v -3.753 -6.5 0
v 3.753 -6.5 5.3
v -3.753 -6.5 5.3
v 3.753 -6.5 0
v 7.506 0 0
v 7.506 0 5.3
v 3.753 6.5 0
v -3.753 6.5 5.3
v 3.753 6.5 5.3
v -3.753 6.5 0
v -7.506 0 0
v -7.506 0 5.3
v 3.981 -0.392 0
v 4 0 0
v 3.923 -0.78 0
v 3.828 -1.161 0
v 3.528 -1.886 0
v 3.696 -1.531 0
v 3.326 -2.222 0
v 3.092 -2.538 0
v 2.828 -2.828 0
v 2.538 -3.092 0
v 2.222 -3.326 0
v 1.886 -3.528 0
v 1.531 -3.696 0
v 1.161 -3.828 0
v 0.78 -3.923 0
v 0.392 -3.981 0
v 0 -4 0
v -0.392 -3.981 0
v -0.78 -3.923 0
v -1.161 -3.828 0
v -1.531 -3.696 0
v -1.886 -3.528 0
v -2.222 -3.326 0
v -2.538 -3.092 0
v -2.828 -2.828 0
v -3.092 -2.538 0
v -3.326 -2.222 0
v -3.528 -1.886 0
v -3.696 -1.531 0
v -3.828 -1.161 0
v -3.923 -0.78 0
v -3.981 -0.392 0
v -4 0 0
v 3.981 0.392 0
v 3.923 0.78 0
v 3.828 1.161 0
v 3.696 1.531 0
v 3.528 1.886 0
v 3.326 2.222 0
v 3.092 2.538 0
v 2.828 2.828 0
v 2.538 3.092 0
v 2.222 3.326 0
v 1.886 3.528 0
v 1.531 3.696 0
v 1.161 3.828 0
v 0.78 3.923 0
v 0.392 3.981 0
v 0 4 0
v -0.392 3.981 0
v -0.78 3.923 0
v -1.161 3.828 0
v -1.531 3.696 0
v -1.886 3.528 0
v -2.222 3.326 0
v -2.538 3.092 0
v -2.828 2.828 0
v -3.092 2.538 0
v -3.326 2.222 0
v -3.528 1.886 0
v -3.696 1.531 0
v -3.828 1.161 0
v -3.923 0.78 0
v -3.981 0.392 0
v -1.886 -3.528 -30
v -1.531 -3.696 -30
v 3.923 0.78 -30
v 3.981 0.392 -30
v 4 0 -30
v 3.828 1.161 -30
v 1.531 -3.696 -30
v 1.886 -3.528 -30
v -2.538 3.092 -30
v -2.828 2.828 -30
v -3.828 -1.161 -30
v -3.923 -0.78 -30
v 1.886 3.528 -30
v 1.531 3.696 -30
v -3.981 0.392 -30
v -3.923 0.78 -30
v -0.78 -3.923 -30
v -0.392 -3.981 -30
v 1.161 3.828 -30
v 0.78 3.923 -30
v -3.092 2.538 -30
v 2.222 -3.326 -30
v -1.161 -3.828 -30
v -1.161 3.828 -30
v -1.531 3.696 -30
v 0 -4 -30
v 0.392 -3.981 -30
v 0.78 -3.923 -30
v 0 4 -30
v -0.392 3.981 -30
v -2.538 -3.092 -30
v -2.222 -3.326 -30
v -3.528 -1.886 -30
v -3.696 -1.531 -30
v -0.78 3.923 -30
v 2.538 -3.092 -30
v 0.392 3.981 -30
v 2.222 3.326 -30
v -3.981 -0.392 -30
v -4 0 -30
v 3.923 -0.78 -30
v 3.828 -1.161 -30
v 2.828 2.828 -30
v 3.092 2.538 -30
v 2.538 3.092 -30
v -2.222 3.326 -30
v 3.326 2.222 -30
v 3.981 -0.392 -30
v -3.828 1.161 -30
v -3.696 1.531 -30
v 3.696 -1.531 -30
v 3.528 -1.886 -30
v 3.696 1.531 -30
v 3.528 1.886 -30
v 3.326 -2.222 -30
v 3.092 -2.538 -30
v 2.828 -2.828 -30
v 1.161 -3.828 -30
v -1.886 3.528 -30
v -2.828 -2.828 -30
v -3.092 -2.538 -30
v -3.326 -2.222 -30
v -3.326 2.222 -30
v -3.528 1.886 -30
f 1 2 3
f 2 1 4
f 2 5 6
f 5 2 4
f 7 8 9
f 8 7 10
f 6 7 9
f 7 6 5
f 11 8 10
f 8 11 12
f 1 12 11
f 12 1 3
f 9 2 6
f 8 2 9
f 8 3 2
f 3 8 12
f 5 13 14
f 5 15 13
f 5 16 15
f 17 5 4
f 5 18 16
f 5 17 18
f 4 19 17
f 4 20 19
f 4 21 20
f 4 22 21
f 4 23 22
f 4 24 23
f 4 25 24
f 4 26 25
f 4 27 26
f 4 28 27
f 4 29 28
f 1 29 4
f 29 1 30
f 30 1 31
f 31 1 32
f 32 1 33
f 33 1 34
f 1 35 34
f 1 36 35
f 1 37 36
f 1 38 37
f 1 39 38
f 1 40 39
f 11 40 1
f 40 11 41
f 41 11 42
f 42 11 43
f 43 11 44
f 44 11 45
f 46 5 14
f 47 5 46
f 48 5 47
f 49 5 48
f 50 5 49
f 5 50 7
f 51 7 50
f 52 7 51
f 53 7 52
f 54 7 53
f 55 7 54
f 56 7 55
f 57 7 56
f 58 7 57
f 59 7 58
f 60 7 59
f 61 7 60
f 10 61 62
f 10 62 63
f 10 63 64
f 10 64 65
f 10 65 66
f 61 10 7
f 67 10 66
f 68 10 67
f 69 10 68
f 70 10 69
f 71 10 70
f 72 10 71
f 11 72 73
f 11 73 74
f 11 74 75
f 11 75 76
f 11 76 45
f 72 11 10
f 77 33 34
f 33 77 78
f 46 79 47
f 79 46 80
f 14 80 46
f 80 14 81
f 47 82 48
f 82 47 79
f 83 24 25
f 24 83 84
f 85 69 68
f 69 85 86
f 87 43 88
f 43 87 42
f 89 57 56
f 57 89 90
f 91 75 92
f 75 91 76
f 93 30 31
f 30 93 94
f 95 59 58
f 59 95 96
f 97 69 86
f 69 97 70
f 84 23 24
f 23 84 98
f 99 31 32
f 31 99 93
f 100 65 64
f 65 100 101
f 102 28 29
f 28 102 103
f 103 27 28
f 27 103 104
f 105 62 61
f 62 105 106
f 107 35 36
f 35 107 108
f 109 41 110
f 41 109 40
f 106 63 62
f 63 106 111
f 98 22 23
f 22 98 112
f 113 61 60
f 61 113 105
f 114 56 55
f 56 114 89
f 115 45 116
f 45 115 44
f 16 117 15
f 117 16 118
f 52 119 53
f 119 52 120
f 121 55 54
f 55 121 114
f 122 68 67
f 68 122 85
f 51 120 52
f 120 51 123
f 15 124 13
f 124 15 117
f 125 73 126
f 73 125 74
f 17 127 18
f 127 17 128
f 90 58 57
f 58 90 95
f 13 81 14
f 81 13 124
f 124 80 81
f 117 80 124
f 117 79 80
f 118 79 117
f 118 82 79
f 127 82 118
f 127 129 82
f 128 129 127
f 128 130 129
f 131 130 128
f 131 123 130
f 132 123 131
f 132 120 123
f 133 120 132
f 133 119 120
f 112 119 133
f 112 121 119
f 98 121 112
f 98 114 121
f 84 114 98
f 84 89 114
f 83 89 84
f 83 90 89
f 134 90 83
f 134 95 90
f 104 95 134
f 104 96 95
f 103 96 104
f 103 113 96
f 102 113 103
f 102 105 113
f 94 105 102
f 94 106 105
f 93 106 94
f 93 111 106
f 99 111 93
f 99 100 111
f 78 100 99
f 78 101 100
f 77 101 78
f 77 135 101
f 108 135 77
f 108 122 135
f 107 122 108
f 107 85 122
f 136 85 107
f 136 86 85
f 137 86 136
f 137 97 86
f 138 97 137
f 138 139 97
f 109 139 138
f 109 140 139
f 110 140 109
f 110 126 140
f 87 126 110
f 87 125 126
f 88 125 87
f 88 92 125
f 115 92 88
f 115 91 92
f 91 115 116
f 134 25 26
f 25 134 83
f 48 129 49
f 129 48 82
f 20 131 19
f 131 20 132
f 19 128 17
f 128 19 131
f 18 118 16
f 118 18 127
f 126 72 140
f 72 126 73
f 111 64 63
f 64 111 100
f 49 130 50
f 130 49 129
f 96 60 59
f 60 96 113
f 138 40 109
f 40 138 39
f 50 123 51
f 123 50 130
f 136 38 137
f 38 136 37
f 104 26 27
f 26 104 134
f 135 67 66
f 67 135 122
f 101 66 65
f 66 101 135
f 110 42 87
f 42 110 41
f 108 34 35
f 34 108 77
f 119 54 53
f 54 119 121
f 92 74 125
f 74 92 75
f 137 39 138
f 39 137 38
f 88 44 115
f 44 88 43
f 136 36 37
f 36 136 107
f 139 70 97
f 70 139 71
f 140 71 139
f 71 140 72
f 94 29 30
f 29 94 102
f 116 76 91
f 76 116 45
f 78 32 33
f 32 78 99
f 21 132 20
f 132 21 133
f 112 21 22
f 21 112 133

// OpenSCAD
// M8 Hex Bolt (simplified without threads)

// Parameters
head_across_flats = 13;    // Across-flats distance (mm)
head_height = 5.3;         // Head height (mm)
shank_diameter = 8;        // Shank diameter (mm)
shank_length = 30;         // Shank length (mm)

// Calculate circumscribed radius for hexagon
// For a regular hexagon with $fn=6, cylinder uses circumradius
// across_flats = 2 * circumradius * cos(30°) = circumradius * sqrt(3)
// Therefore: circumradius = across_flats / sqrt(3)
head_circumradius = head_across_flats / 2 / cos(30);

// Hex head (positioned with bottom at z=0, extending upward)
translate([0, 0, head_height/2])
    cylinder(h = head_height, r = head_circumradius, center = true, $fn = 6);

// Shank (positioned extending downward from z=0)
translate([0, 0, -shank_length/2])
    cylinder(h = shank_length, d = shank_diameter, center = true, $fn = 64);
